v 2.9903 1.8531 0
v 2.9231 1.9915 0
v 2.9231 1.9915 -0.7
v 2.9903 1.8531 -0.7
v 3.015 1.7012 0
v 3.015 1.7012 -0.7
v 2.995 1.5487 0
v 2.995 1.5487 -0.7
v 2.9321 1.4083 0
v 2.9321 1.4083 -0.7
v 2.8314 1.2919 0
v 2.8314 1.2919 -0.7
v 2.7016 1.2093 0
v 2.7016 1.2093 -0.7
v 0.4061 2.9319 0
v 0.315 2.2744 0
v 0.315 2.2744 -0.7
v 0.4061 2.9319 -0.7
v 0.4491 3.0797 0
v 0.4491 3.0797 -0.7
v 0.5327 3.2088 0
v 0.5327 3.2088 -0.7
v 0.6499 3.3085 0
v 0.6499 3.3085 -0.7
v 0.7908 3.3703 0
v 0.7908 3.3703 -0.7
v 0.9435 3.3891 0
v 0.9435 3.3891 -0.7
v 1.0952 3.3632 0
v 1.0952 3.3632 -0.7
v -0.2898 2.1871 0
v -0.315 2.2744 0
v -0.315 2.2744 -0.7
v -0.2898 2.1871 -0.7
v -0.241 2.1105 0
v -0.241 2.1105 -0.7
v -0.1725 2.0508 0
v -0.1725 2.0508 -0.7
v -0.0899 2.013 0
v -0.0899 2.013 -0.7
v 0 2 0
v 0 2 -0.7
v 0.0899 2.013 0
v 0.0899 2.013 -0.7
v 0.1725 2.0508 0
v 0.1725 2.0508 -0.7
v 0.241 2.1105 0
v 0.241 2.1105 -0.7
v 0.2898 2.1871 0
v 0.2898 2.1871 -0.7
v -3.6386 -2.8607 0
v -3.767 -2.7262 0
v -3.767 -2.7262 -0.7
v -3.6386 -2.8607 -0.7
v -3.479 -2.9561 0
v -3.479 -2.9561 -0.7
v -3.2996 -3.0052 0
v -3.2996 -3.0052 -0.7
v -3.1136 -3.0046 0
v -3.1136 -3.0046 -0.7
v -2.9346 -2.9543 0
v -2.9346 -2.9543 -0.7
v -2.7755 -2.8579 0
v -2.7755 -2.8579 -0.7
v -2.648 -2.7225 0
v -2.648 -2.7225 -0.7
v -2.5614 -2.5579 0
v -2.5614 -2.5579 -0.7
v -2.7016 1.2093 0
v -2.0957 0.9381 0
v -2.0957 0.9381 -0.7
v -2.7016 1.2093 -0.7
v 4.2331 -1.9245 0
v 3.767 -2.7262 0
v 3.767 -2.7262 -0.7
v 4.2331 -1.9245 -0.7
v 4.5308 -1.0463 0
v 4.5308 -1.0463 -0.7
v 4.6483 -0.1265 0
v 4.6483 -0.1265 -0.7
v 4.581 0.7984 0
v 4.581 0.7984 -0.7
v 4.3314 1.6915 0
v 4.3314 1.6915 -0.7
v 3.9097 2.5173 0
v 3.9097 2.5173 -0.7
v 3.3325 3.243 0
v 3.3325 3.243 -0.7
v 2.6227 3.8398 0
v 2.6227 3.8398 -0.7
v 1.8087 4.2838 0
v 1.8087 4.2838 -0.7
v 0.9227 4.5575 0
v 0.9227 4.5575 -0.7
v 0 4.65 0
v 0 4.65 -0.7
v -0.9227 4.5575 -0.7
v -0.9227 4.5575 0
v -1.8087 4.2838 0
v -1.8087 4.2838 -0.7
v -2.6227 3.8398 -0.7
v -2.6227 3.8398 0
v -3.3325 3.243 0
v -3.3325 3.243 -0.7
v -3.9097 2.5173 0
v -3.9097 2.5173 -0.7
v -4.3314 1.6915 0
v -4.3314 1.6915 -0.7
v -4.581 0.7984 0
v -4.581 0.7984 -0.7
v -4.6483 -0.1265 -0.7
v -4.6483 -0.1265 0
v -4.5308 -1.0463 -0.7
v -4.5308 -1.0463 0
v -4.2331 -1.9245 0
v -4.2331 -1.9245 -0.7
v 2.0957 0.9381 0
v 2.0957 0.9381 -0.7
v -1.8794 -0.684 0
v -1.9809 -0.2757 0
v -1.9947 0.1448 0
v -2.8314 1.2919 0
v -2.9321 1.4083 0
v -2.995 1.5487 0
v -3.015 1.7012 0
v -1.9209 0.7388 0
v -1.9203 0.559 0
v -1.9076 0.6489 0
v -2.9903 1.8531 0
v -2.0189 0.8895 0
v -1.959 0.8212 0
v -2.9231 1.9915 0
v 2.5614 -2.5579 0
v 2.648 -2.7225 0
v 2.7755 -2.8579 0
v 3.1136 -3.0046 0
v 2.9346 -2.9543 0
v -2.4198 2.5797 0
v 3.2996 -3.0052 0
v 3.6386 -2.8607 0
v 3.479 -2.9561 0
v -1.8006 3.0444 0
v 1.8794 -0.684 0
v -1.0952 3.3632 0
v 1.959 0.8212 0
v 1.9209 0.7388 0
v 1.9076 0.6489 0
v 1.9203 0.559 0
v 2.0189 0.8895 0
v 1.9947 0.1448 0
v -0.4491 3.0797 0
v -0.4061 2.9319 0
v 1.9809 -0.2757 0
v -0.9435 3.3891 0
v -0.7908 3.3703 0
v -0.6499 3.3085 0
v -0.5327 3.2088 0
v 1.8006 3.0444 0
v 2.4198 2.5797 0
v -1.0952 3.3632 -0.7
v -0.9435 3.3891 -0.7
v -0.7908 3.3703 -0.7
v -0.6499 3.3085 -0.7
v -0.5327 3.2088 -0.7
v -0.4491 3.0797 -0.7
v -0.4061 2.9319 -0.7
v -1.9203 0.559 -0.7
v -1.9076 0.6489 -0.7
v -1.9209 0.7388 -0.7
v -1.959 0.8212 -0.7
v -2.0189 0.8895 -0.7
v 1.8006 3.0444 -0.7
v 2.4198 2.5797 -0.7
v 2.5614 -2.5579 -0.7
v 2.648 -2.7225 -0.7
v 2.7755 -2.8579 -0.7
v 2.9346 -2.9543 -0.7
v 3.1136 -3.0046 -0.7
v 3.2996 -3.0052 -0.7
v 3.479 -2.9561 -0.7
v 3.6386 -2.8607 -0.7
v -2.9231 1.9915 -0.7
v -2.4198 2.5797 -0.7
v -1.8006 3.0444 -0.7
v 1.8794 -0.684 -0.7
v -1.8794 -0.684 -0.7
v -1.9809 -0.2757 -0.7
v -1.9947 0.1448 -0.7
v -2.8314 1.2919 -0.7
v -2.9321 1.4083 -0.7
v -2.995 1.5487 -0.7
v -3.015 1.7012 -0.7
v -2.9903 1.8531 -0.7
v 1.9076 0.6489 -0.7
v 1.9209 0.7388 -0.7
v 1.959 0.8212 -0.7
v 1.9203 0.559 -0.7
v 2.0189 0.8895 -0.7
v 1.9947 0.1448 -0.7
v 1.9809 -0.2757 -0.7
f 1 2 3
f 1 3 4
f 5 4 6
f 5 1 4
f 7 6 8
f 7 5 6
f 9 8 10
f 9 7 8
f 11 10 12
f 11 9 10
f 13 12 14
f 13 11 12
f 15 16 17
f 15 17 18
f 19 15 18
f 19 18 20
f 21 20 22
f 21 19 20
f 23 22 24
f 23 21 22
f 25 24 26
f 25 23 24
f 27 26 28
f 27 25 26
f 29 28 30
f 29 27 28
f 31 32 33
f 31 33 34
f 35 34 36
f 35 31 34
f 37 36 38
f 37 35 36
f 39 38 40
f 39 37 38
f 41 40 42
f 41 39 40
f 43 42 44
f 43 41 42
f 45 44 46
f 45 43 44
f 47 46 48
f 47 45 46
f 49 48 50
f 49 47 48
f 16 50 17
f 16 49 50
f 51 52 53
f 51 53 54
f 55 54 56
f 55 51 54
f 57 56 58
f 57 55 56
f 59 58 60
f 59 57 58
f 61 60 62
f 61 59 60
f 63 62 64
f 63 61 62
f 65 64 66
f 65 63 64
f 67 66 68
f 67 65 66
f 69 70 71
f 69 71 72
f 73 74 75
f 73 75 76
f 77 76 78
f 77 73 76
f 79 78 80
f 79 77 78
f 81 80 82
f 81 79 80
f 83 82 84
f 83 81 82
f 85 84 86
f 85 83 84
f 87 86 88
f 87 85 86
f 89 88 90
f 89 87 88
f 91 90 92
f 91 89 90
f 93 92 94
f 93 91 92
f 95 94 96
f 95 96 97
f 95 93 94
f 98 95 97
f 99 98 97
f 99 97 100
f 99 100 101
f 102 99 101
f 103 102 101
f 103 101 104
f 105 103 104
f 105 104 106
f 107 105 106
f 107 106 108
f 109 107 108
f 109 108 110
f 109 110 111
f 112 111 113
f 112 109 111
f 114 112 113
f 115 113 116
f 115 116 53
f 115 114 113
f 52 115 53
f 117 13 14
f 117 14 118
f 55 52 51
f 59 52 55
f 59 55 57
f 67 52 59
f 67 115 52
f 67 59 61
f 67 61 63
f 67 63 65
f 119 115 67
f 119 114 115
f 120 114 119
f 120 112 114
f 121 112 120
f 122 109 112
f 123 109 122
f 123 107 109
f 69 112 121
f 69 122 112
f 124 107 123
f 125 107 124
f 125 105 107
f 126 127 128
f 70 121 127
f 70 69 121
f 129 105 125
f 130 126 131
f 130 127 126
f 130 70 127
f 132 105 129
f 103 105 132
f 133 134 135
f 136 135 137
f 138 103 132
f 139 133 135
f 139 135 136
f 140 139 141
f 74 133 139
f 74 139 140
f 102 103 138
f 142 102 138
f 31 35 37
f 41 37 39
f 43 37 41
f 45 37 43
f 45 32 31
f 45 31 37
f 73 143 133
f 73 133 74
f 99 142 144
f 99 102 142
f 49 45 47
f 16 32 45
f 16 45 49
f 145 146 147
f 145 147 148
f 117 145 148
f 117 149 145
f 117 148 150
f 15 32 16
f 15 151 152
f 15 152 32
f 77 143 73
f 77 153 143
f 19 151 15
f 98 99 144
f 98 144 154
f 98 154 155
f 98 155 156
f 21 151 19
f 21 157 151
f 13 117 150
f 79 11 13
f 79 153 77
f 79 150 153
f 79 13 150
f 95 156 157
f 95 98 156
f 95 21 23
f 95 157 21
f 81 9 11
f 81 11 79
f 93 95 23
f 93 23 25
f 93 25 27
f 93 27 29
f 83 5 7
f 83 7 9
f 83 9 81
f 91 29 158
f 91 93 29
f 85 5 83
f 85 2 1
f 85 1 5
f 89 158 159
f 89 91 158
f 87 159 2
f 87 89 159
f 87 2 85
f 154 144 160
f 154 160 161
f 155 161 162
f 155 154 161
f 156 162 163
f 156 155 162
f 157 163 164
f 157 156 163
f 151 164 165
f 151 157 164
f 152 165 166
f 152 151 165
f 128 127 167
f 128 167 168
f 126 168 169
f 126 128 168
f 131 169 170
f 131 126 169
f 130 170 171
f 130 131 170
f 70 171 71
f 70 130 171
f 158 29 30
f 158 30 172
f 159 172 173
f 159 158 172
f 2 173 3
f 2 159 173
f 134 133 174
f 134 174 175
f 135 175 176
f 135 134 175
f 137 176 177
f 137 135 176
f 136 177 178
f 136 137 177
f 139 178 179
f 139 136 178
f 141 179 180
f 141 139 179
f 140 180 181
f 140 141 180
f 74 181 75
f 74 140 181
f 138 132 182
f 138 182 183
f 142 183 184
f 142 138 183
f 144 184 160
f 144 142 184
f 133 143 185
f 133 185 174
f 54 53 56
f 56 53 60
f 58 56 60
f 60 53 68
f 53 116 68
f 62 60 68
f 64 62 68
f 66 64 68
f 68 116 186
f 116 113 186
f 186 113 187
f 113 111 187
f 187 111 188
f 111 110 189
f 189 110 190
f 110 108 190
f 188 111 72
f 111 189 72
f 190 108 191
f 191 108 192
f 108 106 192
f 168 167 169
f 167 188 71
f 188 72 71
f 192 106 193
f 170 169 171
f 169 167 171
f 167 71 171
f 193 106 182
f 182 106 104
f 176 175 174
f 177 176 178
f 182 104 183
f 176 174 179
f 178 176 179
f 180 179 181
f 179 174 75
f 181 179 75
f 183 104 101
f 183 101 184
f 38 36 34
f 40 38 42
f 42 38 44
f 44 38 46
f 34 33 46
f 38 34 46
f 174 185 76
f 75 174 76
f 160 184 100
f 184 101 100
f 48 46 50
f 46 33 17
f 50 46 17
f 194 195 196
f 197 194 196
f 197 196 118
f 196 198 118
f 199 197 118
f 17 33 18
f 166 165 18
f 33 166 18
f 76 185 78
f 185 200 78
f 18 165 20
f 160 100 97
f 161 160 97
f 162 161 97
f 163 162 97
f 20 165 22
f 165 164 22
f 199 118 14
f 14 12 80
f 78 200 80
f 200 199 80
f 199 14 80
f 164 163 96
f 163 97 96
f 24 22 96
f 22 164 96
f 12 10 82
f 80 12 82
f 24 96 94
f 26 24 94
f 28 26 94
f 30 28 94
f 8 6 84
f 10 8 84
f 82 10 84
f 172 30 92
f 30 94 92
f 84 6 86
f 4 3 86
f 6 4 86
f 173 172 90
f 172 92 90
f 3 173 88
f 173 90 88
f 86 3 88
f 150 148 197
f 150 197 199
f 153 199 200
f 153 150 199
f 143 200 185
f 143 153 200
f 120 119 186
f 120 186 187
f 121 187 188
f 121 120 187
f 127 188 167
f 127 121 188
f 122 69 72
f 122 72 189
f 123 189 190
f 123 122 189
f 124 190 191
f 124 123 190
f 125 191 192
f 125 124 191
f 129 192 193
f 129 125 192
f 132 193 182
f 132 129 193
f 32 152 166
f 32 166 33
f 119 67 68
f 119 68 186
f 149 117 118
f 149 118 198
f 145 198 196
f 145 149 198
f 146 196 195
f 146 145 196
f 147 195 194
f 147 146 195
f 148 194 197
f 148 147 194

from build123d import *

# Parameters (mm, degrees)
BOSS_EXTRUDE1_DEPTH = 0.7


with BuildPart() as part:
    # Sketch1 → Boss-Extrude1 (new body)
    with BuildSketch(Plane.XY):
        with BuildLine():
            Line((-2.561408424, -2.557883579), (-1.879385242, -0.684040287))
            ThreePointArc((-1.879385242, -0.684040287), (-1.99891759, -0.065791087), (-1.920297211, 0.558979983))
            ThreePointArc((-1.920297211, 0.558979983), (-1.937015688, 0.781382977), (-2.095699977, 0.938105328))
            Line((-2.095699977, 0.938105328), (-2.701605558, 1.209328909))
            ThreePointArc((-2.701605558, 1.209328909), (-2.995016962, 1.548683887), (-2.923070831, 1.991488368))
            ThreePointArc((-2.923070831, 1.991488368), (-2.122951492, 2.829036225), (-1.095155737, 3.363183449))
            ThreePointArc((-1.095155737, 3.363183449), (-0.649889409, 3.308503006), (-0.406063751, 2.931938136))
            Line((-0.406063751, 2.931938136), (-0.314993353, 2.274374461))
            ThreePointArc((-0.314993353, 2.274374461), (0, 2), (0.314993353, 2.274374461))
            Line((0.314993353, 2.274374461), (0.406063751, 2.931938136))
            ThreePointArc((0.406063751, 2.931938136), (0.649889409, 3.308503006), (1.095155737, 3.363183449))
            ThreePointArc((1.095155737, 3.363183449), (2.122951492, 2.829036225), (2.923070831, 1.991488368))
            ThreePointArc((2.923070831, 1.991488368), (2.995016962, 1.548683887), (2.701605558, 1.209328909))
            Line((2.701605558, 1.209328909), (2.095699977, 0.938105328))
            ThreePointArc((2.095699977, 0.938105328), (1.937015688, 0.781382977), (1.920297211, 0.558979983))
            ThreePointArc((1.920297211, 0.558979983), (1.99891759, -0.065791087), (1.879385242, -0.684040287))
            Line((1.879385242, -0.684040287), (2.561408424, -2.557883579))
            ThreePointArc((2.561408424, -2.557883579), (3.113603209, -3.004615598), (3.76702433, -2.726174553))
            ThreePointArc((3.76702433, -2.726174553), (0, 4.65), (-3.76702433, -2.726174553))
            ThreePointArc((-3.76702433, -2.726174553), (-3.113603209, -3.004615598), (-2.561408424, -2.557883579))
        make_face()
    extrude(amount=-BOSS_EXTRUDE1_DEPTH)


solid = part.part
